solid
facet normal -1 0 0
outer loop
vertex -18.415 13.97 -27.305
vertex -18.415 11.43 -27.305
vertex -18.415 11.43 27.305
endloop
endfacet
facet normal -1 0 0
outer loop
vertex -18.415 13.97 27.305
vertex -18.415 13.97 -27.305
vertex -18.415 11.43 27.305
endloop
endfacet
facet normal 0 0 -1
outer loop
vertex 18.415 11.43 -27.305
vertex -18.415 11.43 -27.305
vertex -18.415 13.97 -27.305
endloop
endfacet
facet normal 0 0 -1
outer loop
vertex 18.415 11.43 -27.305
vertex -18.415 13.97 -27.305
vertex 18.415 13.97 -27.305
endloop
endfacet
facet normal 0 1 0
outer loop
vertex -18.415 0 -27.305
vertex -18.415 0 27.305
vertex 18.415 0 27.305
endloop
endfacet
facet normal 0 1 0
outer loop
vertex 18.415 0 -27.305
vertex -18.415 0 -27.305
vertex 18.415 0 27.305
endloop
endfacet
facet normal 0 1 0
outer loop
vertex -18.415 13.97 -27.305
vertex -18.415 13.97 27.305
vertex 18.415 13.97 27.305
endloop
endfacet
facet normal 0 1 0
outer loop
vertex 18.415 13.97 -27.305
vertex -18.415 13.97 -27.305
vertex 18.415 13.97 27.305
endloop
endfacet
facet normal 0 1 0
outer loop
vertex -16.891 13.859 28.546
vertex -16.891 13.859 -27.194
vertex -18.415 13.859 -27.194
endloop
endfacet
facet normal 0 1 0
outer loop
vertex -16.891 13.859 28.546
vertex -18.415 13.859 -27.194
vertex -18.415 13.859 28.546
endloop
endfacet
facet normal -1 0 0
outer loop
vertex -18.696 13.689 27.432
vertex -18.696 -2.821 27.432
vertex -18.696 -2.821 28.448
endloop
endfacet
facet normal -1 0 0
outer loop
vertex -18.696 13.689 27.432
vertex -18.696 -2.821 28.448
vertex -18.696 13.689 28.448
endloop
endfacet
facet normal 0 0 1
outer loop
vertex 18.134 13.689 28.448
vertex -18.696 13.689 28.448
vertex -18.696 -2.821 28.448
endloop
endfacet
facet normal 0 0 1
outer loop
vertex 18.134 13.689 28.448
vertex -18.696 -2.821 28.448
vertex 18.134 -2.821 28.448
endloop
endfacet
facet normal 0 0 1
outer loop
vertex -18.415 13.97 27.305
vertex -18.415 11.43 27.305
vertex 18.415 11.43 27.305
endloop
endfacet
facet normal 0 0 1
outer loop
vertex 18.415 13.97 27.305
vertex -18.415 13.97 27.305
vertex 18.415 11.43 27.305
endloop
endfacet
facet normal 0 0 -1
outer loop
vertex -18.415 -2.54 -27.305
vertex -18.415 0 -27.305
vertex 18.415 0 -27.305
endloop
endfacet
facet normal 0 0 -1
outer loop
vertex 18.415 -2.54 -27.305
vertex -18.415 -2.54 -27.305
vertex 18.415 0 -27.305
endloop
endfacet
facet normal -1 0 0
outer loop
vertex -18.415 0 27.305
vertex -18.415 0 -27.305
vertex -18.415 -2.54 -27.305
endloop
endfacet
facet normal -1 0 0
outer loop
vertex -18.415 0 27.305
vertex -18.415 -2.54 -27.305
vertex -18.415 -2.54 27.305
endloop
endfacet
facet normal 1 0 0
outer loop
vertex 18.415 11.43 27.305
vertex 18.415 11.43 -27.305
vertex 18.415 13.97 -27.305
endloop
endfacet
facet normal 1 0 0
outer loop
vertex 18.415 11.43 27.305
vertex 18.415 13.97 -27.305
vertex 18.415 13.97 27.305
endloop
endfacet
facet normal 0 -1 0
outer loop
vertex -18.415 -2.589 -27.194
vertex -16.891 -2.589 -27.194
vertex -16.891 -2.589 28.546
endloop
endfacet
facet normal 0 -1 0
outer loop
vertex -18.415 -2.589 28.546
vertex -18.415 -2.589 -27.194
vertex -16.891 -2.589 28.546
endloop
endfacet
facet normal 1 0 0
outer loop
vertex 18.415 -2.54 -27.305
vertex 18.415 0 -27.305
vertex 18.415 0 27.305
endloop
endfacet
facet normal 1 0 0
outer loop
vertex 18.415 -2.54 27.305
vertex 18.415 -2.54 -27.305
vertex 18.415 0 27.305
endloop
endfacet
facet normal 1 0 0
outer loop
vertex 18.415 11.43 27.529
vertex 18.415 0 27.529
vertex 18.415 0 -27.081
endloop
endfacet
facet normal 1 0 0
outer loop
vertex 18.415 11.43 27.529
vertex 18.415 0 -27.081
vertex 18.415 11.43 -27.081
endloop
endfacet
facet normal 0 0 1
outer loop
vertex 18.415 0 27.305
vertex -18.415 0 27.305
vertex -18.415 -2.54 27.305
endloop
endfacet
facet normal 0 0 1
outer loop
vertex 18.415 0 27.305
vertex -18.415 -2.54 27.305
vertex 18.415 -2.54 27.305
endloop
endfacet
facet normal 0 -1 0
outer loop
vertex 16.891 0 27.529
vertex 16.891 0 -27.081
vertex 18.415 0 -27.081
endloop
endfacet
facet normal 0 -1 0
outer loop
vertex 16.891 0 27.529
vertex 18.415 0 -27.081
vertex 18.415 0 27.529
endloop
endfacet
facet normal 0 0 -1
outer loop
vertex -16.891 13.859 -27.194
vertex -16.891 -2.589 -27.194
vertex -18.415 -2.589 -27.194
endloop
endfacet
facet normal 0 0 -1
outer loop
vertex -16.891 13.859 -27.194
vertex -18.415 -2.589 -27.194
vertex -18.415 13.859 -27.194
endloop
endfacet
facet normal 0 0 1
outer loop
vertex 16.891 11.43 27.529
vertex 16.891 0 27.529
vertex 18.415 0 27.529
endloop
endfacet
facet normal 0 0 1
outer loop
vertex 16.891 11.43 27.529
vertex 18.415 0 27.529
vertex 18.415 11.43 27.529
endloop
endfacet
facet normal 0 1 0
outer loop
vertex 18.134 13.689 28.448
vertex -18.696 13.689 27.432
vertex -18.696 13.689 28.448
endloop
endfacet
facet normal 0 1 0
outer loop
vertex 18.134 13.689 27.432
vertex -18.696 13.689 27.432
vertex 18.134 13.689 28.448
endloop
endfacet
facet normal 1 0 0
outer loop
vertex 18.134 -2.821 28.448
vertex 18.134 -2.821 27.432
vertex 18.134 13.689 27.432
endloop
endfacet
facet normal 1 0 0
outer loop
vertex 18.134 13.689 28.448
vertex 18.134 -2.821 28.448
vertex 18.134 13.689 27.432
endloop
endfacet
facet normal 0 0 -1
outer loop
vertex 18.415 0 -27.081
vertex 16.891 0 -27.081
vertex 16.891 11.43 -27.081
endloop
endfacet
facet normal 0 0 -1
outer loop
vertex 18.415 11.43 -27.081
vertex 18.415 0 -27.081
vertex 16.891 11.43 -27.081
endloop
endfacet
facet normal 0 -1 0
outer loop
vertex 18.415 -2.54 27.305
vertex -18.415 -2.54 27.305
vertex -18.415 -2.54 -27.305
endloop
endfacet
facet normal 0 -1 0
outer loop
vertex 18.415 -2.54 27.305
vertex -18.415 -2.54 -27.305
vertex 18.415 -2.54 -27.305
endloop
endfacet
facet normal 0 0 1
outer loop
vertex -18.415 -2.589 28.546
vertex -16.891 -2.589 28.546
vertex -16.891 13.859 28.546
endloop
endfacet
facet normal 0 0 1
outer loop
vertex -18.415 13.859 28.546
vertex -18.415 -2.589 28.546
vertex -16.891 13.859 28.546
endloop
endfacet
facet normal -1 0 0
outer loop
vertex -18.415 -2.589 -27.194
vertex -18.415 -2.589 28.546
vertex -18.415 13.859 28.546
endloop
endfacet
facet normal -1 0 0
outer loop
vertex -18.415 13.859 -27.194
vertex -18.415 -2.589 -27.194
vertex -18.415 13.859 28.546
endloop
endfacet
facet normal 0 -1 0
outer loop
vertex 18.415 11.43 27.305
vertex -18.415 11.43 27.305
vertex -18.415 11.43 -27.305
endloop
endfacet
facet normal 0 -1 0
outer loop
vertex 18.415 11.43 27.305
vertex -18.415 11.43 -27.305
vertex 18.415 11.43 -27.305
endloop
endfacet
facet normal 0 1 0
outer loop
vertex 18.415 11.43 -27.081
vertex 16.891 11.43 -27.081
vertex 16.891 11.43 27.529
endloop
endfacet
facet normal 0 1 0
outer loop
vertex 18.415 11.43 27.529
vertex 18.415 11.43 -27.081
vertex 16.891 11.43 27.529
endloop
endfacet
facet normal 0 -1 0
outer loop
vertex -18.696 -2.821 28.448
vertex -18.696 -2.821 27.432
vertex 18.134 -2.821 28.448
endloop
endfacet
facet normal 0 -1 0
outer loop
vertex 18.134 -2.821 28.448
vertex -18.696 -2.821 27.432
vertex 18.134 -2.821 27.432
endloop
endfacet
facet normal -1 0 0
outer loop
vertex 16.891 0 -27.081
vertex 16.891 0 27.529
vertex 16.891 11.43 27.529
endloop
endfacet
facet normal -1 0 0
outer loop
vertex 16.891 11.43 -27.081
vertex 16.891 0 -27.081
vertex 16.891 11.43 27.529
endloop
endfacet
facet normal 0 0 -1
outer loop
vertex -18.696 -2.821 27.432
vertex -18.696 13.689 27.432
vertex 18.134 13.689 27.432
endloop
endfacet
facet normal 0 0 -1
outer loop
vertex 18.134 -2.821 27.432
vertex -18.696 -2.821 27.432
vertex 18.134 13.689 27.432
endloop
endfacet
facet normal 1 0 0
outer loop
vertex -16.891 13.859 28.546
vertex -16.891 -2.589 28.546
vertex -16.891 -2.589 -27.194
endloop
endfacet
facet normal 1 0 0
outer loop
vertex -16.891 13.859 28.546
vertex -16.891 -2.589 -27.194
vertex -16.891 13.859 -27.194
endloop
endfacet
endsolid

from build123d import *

# Parameters (mm, degrees)
F0_W     = 36.83
F0_H     = 54.61
F3_DEPTH = 2.54
F4_START = -11.43
F2_W     = 36.83
F2_H     = 54.61
F4_DEPTH = 2.54
F5_START = 16.891
F1_W     = 11.43
F1_H     = 54.61
F5_DEPTH = 1.524
F7_START = 27.432
F6_W     = 36.83
F6_H     = 16.51
F7_DEPTH = 1.016
F9_START = -16.891
F8_W     = 16.4478868246
F8_H     = 55.7400621474
F9_DEPTH = 1.524


with BuildPart() as f3:
    # F0 (on Front) → F3 (new body)
    with BuildSketch(Plane.XZ):
        Rectangle(F0_W, F0_H)
    extrude(amount=F3_DEPTH)


with BuildPart() as f4:
    # F2 (on Front) → F4 (new body)
    with BuildSketch(Plane.XZ.offset(F4_START)):
        Rectangle(F2_W, F2_H)
    extrude(amount=-F4_DEPTH)


with BuildPart() as f5:
    # F1 (on Right) → F5 (new body)
    with BuildSketch(Plane.YZ.offset(F5_START)):
        with Locations((5.715, 0.2239052389)):
            Rectangle(F1_W, F1_H)
    extrude(amount=F5_DEPTH)


with BuildPart() as f7:
    # F6 (on Top) → F7 (new body)
    with BuildSketch(Plane.XY.offset(F7_START)):
        with Locations((-0.2812305465, 5.4336267127)):
            Rectangle(F6_W, F6_H)
    extrude(amount=F7_DEPTH)


with BuildPart() as f9:
    # F8 (on Right) → F9 (new body)
    with BuildSketch(Plane.YZ.offset(F9_START)):
        with Locations((5.6349243969, 0.6760600954)):
            Rectangle(F8_W, F8_H)
    extrude(amount=-F9_DEPTH)


solid = Compound([f3.part, f4.part, f5.part, f7.part, f9.part])
